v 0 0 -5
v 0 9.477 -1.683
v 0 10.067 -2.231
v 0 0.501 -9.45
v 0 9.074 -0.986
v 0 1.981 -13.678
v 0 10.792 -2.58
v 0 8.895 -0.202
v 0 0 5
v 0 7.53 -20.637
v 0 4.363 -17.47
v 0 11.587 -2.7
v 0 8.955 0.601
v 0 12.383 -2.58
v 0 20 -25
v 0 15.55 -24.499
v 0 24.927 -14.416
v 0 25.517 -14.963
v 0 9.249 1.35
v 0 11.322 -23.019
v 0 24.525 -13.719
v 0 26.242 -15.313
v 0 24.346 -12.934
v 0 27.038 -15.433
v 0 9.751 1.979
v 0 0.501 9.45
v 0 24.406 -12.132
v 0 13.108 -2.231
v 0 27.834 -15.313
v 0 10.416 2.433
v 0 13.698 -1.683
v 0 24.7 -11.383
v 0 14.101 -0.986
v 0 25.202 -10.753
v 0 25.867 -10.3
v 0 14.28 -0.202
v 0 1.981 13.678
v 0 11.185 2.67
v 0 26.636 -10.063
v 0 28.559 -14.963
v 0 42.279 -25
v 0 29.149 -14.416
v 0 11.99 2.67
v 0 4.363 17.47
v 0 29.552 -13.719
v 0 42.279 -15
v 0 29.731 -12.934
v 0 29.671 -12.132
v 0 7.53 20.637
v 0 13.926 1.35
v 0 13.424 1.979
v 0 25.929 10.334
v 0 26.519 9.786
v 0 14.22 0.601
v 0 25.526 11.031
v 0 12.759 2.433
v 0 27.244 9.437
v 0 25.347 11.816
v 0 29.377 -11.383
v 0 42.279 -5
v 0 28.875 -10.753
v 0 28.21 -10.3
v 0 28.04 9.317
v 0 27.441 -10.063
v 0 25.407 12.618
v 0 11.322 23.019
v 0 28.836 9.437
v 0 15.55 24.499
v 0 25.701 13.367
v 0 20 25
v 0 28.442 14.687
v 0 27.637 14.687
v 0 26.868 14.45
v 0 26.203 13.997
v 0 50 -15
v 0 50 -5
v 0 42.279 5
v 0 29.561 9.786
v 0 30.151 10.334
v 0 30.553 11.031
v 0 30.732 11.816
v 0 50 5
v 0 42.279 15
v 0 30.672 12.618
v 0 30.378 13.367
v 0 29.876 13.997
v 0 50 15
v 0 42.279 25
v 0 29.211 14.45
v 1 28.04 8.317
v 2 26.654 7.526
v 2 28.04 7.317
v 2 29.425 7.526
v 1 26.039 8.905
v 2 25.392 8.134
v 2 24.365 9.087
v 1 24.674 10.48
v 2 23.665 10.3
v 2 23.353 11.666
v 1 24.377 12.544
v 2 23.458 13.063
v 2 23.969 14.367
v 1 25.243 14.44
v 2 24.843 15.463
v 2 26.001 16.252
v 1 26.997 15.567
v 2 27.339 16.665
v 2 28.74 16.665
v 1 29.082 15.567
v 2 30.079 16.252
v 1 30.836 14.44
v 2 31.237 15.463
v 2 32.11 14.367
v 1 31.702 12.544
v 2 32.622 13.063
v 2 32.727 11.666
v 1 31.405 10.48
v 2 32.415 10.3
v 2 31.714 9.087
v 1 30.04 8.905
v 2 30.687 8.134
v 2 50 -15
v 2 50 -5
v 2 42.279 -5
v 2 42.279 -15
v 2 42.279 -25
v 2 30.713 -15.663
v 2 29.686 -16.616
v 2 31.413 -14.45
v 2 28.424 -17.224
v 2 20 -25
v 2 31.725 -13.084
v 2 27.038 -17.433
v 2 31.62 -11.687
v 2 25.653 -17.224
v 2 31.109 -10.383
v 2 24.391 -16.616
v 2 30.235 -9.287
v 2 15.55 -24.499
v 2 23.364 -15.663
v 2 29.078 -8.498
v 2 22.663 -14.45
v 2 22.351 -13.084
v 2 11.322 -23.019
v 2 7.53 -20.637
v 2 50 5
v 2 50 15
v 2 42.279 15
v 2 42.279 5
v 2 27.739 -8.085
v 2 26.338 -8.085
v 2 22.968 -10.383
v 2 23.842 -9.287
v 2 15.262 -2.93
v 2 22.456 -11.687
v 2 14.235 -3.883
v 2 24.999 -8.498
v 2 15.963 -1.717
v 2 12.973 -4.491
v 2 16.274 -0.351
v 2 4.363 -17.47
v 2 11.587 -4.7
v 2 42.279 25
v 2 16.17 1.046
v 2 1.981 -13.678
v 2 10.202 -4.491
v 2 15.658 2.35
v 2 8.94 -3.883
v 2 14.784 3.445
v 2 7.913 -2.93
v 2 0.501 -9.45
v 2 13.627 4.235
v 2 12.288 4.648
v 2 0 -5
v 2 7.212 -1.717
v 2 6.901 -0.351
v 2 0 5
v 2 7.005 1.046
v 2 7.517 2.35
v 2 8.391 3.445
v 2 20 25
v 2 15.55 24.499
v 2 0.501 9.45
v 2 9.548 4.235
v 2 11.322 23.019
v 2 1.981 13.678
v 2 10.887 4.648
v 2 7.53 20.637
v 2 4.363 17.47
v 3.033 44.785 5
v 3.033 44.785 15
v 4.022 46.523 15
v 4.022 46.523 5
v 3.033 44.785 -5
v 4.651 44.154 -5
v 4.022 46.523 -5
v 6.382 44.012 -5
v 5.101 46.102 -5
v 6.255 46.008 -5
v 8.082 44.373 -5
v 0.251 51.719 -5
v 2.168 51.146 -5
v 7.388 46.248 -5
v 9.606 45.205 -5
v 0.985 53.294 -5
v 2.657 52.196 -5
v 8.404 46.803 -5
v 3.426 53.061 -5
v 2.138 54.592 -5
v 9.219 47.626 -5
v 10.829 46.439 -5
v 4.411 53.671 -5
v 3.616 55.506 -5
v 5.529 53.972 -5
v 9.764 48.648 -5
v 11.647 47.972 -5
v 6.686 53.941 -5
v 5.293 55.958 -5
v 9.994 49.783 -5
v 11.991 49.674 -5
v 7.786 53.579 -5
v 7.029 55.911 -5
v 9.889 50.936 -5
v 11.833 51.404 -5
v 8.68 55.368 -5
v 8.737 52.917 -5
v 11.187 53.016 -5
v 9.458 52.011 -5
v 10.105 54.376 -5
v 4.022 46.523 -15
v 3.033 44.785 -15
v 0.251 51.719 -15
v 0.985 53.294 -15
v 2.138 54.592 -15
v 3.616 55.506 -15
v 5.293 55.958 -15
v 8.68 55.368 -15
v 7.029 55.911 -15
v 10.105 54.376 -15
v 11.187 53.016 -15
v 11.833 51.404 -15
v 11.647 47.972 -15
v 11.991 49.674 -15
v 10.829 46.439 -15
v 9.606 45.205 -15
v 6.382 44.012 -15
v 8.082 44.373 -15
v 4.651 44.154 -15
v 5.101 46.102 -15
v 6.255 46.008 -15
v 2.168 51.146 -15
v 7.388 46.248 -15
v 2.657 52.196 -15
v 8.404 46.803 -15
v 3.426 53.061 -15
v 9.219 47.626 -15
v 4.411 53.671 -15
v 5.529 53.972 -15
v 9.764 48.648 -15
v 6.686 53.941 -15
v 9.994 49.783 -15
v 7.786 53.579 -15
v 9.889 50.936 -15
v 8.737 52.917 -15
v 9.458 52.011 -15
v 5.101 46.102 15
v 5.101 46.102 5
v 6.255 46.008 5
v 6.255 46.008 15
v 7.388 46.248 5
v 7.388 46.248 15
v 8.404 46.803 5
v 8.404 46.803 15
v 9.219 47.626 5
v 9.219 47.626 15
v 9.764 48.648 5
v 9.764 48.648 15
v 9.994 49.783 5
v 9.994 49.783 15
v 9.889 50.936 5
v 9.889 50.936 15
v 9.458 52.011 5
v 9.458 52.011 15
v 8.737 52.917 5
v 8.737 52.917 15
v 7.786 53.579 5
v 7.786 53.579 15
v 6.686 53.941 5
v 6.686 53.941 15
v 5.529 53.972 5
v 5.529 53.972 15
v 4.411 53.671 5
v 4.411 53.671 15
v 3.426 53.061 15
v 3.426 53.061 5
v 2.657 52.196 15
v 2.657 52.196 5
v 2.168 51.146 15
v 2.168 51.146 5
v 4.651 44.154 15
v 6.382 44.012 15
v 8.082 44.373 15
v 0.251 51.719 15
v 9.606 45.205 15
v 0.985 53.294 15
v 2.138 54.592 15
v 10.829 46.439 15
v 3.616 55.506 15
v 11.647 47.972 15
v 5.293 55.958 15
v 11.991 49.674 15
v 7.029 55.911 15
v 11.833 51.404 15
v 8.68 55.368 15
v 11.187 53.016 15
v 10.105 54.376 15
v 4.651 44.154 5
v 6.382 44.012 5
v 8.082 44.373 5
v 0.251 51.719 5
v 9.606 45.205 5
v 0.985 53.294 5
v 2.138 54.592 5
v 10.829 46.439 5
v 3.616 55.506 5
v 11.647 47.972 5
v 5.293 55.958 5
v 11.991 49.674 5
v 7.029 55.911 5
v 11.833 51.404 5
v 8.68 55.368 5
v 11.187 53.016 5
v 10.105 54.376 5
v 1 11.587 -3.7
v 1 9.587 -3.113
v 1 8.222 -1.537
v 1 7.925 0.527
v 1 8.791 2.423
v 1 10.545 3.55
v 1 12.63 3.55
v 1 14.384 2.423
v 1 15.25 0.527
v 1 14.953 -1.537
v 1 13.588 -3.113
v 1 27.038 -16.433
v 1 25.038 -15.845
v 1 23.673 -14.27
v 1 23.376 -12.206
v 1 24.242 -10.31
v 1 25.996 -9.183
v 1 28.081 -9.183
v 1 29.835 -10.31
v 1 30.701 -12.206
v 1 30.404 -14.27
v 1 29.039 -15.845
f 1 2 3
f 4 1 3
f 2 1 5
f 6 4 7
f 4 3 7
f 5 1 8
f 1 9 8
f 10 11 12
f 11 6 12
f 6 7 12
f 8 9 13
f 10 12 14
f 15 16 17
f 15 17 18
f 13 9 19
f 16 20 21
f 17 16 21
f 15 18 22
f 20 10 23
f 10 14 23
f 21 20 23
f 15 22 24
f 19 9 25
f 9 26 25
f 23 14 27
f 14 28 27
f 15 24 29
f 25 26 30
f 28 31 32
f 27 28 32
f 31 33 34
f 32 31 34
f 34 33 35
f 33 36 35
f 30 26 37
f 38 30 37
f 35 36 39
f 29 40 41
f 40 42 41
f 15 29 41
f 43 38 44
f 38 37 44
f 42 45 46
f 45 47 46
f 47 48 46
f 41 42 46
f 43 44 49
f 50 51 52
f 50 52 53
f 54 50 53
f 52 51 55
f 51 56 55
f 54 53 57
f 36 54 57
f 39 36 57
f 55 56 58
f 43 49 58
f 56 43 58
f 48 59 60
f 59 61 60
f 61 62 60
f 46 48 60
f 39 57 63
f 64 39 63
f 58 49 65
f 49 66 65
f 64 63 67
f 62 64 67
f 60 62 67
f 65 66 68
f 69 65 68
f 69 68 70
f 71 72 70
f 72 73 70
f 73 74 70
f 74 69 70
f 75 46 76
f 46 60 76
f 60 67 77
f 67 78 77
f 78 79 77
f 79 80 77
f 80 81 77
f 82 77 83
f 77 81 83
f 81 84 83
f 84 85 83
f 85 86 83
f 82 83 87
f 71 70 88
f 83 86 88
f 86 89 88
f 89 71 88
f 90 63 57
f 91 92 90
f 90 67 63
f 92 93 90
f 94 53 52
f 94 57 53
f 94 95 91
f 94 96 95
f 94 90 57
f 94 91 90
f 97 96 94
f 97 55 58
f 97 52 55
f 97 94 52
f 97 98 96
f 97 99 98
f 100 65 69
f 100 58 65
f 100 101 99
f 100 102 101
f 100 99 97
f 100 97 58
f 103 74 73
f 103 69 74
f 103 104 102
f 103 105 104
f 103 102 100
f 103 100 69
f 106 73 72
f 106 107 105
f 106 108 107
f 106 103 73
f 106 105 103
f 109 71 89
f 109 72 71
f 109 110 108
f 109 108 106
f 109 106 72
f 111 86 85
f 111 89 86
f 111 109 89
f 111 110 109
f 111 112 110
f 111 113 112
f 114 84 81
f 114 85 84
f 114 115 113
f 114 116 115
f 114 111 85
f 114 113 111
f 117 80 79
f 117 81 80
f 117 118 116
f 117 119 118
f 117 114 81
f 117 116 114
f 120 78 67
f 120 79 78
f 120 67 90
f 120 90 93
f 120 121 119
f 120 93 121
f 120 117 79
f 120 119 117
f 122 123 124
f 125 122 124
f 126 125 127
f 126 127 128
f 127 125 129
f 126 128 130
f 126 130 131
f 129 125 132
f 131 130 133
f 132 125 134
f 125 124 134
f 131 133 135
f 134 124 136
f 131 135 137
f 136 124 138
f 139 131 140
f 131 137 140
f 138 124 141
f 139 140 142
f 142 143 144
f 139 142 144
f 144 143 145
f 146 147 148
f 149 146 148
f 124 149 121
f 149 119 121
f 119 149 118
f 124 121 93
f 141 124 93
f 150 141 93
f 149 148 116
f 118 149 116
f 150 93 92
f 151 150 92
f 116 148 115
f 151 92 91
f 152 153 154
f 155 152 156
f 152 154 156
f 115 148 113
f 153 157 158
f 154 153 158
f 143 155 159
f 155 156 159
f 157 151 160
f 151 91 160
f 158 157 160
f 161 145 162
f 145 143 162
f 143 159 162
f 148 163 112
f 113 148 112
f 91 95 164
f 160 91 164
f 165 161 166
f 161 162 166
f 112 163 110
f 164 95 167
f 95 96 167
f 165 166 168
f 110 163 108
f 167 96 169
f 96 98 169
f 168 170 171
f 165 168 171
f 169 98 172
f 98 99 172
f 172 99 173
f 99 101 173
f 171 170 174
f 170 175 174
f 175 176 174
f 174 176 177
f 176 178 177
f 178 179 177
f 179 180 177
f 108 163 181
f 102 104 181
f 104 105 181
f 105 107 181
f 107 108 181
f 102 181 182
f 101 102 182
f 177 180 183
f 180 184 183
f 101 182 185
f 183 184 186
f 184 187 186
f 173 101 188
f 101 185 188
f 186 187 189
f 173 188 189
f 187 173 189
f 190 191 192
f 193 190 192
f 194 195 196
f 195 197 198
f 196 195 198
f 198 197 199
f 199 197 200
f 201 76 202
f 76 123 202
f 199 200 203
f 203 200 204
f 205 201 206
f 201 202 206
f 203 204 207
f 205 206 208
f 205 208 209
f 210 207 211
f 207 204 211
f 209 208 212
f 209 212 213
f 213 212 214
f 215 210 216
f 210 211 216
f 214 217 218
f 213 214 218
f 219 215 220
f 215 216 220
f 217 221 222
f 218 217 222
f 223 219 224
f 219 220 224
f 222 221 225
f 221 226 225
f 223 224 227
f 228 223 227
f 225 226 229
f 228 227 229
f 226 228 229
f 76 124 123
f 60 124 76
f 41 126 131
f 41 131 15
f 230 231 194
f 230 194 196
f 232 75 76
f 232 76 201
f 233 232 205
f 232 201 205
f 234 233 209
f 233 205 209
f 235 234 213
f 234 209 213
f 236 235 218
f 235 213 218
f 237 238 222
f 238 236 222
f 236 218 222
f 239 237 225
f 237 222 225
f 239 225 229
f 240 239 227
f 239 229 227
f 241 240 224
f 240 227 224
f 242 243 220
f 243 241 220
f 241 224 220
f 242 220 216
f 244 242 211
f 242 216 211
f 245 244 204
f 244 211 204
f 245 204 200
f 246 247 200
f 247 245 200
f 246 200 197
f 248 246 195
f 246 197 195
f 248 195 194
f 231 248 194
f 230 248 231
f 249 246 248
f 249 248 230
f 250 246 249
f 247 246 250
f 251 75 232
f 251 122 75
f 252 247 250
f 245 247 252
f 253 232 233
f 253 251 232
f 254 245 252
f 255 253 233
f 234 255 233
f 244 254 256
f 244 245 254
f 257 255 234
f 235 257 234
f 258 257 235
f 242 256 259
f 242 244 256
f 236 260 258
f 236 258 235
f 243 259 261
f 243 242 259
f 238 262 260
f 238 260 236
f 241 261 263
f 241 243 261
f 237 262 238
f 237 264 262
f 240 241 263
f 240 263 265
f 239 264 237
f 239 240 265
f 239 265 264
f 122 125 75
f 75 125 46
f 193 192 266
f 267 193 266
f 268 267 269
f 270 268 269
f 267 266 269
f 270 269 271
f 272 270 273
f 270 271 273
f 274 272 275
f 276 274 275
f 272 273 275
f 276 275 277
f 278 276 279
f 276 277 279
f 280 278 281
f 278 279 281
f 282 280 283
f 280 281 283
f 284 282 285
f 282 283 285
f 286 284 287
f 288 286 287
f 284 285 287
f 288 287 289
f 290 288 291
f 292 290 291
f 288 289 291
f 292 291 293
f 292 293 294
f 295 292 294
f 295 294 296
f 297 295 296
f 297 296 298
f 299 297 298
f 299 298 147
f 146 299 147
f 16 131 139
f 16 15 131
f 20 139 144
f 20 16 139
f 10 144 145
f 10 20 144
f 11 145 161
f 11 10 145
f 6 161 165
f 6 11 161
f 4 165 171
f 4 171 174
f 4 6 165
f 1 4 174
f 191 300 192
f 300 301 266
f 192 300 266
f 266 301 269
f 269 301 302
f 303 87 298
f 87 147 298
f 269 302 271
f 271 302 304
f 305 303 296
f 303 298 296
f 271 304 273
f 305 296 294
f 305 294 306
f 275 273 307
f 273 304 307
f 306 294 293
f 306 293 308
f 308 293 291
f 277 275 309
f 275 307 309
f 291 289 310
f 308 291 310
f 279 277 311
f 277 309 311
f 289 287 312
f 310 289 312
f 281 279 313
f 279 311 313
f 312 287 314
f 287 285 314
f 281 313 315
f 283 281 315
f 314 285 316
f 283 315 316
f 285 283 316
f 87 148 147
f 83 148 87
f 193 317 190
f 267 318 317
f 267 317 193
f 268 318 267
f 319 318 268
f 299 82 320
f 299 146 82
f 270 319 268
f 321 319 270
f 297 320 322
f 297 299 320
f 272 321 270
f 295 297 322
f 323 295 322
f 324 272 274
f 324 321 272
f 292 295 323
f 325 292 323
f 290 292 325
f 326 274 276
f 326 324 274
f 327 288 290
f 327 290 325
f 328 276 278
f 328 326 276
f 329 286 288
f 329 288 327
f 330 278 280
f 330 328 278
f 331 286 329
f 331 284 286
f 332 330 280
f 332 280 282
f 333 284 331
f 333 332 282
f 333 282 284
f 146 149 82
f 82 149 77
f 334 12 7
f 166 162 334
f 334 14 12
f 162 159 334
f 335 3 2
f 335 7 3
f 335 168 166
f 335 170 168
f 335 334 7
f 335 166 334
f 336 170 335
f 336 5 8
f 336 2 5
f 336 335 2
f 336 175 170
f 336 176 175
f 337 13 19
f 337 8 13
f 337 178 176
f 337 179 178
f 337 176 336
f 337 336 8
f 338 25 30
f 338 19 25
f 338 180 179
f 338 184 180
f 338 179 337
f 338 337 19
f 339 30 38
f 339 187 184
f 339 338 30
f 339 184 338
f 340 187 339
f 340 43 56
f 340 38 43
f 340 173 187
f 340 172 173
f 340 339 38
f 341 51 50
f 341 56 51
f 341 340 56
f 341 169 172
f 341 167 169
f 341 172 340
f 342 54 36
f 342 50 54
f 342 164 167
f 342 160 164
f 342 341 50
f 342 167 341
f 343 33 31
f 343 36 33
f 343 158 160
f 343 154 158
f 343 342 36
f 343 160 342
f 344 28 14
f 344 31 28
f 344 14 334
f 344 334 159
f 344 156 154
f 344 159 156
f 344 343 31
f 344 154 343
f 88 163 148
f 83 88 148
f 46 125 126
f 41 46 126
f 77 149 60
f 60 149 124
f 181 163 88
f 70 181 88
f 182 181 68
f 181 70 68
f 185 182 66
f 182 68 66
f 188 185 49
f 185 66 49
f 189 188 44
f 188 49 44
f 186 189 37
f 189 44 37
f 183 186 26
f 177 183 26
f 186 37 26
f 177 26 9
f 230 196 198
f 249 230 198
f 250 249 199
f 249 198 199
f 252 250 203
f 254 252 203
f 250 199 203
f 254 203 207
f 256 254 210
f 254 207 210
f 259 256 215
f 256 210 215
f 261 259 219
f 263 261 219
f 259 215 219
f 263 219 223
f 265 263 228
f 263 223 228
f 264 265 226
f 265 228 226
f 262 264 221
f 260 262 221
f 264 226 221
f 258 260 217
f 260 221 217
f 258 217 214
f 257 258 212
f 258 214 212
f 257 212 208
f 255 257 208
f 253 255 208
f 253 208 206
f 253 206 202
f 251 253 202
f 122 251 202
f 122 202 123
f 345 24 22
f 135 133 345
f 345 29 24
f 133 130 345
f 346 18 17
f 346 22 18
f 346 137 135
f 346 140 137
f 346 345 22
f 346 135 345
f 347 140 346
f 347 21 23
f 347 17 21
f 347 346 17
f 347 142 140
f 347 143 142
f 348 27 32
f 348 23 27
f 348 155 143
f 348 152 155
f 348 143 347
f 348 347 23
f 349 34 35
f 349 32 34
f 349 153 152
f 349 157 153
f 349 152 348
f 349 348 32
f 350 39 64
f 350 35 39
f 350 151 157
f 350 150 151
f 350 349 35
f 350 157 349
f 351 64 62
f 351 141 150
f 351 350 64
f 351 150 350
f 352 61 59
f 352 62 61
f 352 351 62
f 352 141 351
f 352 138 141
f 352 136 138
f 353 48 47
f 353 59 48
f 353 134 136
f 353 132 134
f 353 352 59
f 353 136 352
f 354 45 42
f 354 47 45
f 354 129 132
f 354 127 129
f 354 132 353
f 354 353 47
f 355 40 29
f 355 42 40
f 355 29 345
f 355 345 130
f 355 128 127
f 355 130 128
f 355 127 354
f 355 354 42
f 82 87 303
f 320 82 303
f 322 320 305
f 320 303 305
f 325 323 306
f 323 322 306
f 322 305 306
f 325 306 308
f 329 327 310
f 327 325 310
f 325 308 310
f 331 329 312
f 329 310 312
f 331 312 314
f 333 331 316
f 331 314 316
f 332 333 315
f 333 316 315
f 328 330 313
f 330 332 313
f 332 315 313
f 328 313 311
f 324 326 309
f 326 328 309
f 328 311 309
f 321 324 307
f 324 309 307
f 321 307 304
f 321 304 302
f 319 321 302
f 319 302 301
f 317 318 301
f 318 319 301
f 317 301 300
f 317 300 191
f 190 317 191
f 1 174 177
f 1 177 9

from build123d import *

# Parameters (mm, degrees)
BOSS_EXTRUDE1_DEPTH                          = 25
SKETCH2_W                                    = 13.175144841
SKETCH2_H                                    = 18.76358654
SKETCH2_W_2                                  = 10
SKETCH2_W_3                                  = 19.622994234
CUT_EXTRUDE1_DEPTH                           = 11
CUT_EXTRUDE1_DEPTH_BACK                      = 3
FILLET1_R                                    = 20
CSK_FOR_M4_COUNTERSUNK_FLAT_HEAD_SCR_2_COUNT = 2
CSK_FOR_M4_COUNTERSUNK_FLAT_HEAD_SCR_2_PITCH = 20.373860658
CSK_FOR_M4_COUNTERSUNK_FLAT_HEAD_SCR_3_COUNT = 2
CSK_FOR_M4_COUNTERSUNK_FLAT_HEAD_SCR_3_PITCH = 20.021215351


with BuildPart() as part:
    # Sketch1 → Boss-Extrude1 (new body, symmetric)
    with BuildSketch(Plane.XY):
        with BuildLine():
            Line((0, 0), (0, 50))
            ThreePointArc((0, 50), (11.186683916, 53.016340491), (3.032769985, 44.785065097))
            Line((3.032769985, 44.785065097), (4.021846657, 46.523376732))
            ThreePointArc((4.021846657, 46.523376732), (9.457789277, 52.01089366), (2, 50))
            Line((2, 50), (2, 0))
            Line((2, 0), (0, 0))
        make_face()
    extrude(amount=BOSS_EXTRUDE1_DEPTH, both=True)

    # Sketch2 → Cut-Extrude1 (cut, two sides)
    with BuildSketch(Plane(origin=(2, 0, 0), x_dir=(0, 0, -1), z_dir=(1, 0, 0))) as cut_extrude1_sk:
        with Locations((-21.587572421, 51.660780085)):
            Rectangle(SKETCH2_W, SKETCH2_H)
        with Locations((0, 51.660780085)):
            Rectangle(SKETCH2_W_2, SKETCH2_H)
        with Locations((24.811497117, 51.660780085)):
            Rectangle(SKETCH2_W_3, SKETCH2_H)
    extrude(amount=CUT_EXTRUDE1_DEPTH, mode=Mode.SUBTRACT)
    extrude(cut_extrude1_sk.sketch, amount=-CUT_EXTRUDE1_DEPTH_BACK, mode=Mode.SUBTRACT)

    # Fillet1
    fillet1_edges = [part.edges().sort_by_distance(p)[0] for p in [
        (1, 0, 25),
        (1, 0, -25),
    ]]
    fillet(fillet1_edges, radius=FILLET1_R)

    # Sketch4 → CSK for M4 Countersunk Flat Head Screw1 (revolve, cut)
    with BuildSketch(Plane(origin=(2, 11.587467643, 0), x_dir=(0, 0, -1), z_dir=(0, 1, 0))):
        Polygon((0, 0), (0, 2), (2.25, 2), (2.25, 2.45), (4.7, 0), align=None)
    csk_for_m4_countersunk_flat_head_screw1 = revolve(axis=Axis((8.35, 11.587467643, 0), (-1, 0, 0)), mode=Mode.SUBTRACT)

    # CSK for M4 Countersunk Flat Head Scr 2: CSK for M4 Countersunk Flat Head Screw1 ×2
    with Locations(*[Vector(0, 0.807519759, 0.58984052) * (i * CSK_FOR_M4_COUNTERSUNK_FLAT_HEAD_SCR_2_PITCH) for i in range(1, CSK_FOR_M4_COUNTERSUNK_FLAT_HEAD_SCR_2_COUNT)]):
        add(csk_for_m4_countersunk_flat_head_screw1, mode=Mode.SUBTRACT)

    # CSK for M4 Countersunk Flat Head Scr 3: CSK for M4 Countersunk Flat Head Screw1 ×2
    with Locations(*[Vector(0, 0.77172393, -0.635957683) * (i * CSK_FOR_M4_COUNTERSUNK_FLAT_HEAD_SCR_3_PITCH) for i in range(1, CSK_FOR_M4_COUNTERSUNK_FLAT_HEAD_SCR_3_COUNT)]):
        add(csk_for_m4_countersunk_flat_head_screw1, mode=Mode.SUBTRACT)


solid = part.part
